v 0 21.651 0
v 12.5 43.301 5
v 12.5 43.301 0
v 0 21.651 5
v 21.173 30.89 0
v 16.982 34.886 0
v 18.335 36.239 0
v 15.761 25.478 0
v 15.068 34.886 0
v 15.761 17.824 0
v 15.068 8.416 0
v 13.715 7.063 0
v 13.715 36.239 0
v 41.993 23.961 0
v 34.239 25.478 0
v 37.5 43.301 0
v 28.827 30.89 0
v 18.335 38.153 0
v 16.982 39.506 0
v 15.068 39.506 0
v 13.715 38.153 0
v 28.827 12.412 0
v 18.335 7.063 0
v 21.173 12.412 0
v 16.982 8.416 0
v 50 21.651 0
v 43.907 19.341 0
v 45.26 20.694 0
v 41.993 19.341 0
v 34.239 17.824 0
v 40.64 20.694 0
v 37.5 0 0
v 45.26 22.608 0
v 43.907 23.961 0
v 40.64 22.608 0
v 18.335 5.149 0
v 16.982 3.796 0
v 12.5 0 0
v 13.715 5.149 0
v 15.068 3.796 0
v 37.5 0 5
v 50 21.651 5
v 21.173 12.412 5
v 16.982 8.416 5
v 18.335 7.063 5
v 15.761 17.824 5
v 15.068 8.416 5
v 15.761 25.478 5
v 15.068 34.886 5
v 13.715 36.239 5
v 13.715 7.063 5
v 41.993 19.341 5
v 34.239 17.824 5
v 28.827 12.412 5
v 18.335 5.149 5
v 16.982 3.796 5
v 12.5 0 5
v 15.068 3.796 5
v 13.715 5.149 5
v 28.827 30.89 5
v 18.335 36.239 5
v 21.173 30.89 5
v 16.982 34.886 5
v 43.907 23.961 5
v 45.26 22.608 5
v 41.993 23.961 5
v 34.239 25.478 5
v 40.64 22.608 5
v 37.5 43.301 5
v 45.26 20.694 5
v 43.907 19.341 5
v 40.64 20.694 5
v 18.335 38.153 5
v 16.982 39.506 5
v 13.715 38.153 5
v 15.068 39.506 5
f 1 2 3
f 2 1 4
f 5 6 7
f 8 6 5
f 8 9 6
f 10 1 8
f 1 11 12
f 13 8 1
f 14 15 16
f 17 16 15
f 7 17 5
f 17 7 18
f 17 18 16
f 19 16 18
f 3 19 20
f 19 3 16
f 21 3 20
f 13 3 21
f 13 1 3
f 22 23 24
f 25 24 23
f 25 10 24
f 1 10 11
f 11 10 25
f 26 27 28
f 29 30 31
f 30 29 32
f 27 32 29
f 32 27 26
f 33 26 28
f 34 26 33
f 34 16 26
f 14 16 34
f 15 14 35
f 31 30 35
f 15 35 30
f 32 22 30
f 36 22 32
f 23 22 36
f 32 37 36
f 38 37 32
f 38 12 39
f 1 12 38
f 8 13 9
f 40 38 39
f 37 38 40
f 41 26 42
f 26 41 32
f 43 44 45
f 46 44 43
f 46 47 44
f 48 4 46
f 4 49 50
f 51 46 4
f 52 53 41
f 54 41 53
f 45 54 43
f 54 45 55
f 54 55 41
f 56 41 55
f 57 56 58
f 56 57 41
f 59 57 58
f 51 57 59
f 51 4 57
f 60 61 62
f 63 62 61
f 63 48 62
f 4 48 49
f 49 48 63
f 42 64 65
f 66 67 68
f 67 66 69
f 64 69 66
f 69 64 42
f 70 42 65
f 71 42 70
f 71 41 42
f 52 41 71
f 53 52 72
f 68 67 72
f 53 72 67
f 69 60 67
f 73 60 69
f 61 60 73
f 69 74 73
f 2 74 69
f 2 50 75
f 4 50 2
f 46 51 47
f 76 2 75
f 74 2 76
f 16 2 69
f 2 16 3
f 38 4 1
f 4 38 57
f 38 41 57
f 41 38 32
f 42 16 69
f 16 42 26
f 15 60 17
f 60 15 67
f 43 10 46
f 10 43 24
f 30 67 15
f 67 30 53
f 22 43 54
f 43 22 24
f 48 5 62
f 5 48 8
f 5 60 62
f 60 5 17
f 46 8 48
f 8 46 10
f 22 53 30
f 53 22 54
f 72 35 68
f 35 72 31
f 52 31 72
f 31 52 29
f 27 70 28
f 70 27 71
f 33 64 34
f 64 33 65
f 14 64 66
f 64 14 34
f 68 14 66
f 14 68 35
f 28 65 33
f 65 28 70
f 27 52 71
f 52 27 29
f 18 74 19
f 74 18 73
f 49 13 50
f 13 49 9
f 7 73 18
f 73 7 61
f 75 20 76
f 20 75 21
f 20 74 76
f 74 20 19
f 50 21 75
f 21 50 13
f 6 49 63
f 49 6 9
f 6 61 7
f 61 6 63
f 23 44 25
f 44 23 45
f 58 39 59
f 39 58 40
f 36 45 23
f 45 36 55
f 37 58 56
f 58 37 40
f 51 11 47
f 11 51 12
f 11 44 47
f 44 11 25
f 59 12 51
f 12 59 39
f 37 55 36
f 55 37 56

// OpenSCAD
$fn = 32;

// ----------------------------------------------------------------------
// Polygon plate: 6-gon R25, 3 bolt windows
// ----------------------------------------------------------------------

// --- parameters (mm) ---
sides = 6;                // number of polygon sides
plate_r = 25;             // circumscribed radius of the polygon
bore_r = 10;              // centre bore radius
bolts = 3;                // number of bolt windows
ring_r = 17.95;           // bolt-circle radius
bolt_r = 2.5;             // bolt window radius
plate_t = 5;              // plate thickness, Z (extrusion height)

plate_d = 2 * plate_r;  // circumscribed diameter
bore_d = 2 * bore_r;  // centre bore diameter
bolt_d = 2 * bolt_r;  // bolt window diameter
ring_d = 2 * ring_r;  // bolt-circle diameter

profile = [[50, 21.651], [37.5, 43.301], [12.5, 43.301], [0, 21.651], [12.5, 0], [37.5, 0]];  // primary outline, 6 points, counter clockwise
void_1 = [[34.239, 25.478], [28.827, 30.89], [21.173, 30.89], [15.761, 25.478], [15.761, 17.824], [21.173, 12.412], [28.827, 12.412], [34.239, 17.824]];  // centre bore, 8 points
void_2 = [[45.26, 22.608], [43.907, 23.961], [41.993, 23.961], [40.64, 22.608], [40.64, 20.694], [41.993, 19.341], [43.907, 19.341], [45.26, 20.694]];  // bolt window 1, 8 points
void_3 = [[18.335, 38.153], [16.982, 39.506], [15.068, 39.506], [13.715, 38.153], [13.715, 36.239], [15.068, 34.886], [16.982, 34.886], [18.335, 36.239]];  // bolt window 2, 8 points
void_4 = [[18.335, 7.063], [16.982, 8.416], [15.068, 8.416], [13.715, 7.063], [13.715, 5.149], [15.068, 3.796], [16.982, 3.796], [18.335, 5.149]];  // bolt window 3, 8 points

// --- the one profile operation ---
difference() {
  linear_extrude(height = plate_t) polygon(points = profile);
  translate([0, 0, -1])
    linear_extrude(height = plate_t + 2) polygon(points = void_1);
  translate([0, 0, -1])
    linear_extrude(height = plate_t + 2) polygon(points = void_2);
  translate([0, 0, -1])
    linear_extrude(height = plate_t + 2) polygon(points = void_3);
  translate([0, 0, -1])
    linear_extrude(height = plate_t + 2) polygon(points = void_4);
}
